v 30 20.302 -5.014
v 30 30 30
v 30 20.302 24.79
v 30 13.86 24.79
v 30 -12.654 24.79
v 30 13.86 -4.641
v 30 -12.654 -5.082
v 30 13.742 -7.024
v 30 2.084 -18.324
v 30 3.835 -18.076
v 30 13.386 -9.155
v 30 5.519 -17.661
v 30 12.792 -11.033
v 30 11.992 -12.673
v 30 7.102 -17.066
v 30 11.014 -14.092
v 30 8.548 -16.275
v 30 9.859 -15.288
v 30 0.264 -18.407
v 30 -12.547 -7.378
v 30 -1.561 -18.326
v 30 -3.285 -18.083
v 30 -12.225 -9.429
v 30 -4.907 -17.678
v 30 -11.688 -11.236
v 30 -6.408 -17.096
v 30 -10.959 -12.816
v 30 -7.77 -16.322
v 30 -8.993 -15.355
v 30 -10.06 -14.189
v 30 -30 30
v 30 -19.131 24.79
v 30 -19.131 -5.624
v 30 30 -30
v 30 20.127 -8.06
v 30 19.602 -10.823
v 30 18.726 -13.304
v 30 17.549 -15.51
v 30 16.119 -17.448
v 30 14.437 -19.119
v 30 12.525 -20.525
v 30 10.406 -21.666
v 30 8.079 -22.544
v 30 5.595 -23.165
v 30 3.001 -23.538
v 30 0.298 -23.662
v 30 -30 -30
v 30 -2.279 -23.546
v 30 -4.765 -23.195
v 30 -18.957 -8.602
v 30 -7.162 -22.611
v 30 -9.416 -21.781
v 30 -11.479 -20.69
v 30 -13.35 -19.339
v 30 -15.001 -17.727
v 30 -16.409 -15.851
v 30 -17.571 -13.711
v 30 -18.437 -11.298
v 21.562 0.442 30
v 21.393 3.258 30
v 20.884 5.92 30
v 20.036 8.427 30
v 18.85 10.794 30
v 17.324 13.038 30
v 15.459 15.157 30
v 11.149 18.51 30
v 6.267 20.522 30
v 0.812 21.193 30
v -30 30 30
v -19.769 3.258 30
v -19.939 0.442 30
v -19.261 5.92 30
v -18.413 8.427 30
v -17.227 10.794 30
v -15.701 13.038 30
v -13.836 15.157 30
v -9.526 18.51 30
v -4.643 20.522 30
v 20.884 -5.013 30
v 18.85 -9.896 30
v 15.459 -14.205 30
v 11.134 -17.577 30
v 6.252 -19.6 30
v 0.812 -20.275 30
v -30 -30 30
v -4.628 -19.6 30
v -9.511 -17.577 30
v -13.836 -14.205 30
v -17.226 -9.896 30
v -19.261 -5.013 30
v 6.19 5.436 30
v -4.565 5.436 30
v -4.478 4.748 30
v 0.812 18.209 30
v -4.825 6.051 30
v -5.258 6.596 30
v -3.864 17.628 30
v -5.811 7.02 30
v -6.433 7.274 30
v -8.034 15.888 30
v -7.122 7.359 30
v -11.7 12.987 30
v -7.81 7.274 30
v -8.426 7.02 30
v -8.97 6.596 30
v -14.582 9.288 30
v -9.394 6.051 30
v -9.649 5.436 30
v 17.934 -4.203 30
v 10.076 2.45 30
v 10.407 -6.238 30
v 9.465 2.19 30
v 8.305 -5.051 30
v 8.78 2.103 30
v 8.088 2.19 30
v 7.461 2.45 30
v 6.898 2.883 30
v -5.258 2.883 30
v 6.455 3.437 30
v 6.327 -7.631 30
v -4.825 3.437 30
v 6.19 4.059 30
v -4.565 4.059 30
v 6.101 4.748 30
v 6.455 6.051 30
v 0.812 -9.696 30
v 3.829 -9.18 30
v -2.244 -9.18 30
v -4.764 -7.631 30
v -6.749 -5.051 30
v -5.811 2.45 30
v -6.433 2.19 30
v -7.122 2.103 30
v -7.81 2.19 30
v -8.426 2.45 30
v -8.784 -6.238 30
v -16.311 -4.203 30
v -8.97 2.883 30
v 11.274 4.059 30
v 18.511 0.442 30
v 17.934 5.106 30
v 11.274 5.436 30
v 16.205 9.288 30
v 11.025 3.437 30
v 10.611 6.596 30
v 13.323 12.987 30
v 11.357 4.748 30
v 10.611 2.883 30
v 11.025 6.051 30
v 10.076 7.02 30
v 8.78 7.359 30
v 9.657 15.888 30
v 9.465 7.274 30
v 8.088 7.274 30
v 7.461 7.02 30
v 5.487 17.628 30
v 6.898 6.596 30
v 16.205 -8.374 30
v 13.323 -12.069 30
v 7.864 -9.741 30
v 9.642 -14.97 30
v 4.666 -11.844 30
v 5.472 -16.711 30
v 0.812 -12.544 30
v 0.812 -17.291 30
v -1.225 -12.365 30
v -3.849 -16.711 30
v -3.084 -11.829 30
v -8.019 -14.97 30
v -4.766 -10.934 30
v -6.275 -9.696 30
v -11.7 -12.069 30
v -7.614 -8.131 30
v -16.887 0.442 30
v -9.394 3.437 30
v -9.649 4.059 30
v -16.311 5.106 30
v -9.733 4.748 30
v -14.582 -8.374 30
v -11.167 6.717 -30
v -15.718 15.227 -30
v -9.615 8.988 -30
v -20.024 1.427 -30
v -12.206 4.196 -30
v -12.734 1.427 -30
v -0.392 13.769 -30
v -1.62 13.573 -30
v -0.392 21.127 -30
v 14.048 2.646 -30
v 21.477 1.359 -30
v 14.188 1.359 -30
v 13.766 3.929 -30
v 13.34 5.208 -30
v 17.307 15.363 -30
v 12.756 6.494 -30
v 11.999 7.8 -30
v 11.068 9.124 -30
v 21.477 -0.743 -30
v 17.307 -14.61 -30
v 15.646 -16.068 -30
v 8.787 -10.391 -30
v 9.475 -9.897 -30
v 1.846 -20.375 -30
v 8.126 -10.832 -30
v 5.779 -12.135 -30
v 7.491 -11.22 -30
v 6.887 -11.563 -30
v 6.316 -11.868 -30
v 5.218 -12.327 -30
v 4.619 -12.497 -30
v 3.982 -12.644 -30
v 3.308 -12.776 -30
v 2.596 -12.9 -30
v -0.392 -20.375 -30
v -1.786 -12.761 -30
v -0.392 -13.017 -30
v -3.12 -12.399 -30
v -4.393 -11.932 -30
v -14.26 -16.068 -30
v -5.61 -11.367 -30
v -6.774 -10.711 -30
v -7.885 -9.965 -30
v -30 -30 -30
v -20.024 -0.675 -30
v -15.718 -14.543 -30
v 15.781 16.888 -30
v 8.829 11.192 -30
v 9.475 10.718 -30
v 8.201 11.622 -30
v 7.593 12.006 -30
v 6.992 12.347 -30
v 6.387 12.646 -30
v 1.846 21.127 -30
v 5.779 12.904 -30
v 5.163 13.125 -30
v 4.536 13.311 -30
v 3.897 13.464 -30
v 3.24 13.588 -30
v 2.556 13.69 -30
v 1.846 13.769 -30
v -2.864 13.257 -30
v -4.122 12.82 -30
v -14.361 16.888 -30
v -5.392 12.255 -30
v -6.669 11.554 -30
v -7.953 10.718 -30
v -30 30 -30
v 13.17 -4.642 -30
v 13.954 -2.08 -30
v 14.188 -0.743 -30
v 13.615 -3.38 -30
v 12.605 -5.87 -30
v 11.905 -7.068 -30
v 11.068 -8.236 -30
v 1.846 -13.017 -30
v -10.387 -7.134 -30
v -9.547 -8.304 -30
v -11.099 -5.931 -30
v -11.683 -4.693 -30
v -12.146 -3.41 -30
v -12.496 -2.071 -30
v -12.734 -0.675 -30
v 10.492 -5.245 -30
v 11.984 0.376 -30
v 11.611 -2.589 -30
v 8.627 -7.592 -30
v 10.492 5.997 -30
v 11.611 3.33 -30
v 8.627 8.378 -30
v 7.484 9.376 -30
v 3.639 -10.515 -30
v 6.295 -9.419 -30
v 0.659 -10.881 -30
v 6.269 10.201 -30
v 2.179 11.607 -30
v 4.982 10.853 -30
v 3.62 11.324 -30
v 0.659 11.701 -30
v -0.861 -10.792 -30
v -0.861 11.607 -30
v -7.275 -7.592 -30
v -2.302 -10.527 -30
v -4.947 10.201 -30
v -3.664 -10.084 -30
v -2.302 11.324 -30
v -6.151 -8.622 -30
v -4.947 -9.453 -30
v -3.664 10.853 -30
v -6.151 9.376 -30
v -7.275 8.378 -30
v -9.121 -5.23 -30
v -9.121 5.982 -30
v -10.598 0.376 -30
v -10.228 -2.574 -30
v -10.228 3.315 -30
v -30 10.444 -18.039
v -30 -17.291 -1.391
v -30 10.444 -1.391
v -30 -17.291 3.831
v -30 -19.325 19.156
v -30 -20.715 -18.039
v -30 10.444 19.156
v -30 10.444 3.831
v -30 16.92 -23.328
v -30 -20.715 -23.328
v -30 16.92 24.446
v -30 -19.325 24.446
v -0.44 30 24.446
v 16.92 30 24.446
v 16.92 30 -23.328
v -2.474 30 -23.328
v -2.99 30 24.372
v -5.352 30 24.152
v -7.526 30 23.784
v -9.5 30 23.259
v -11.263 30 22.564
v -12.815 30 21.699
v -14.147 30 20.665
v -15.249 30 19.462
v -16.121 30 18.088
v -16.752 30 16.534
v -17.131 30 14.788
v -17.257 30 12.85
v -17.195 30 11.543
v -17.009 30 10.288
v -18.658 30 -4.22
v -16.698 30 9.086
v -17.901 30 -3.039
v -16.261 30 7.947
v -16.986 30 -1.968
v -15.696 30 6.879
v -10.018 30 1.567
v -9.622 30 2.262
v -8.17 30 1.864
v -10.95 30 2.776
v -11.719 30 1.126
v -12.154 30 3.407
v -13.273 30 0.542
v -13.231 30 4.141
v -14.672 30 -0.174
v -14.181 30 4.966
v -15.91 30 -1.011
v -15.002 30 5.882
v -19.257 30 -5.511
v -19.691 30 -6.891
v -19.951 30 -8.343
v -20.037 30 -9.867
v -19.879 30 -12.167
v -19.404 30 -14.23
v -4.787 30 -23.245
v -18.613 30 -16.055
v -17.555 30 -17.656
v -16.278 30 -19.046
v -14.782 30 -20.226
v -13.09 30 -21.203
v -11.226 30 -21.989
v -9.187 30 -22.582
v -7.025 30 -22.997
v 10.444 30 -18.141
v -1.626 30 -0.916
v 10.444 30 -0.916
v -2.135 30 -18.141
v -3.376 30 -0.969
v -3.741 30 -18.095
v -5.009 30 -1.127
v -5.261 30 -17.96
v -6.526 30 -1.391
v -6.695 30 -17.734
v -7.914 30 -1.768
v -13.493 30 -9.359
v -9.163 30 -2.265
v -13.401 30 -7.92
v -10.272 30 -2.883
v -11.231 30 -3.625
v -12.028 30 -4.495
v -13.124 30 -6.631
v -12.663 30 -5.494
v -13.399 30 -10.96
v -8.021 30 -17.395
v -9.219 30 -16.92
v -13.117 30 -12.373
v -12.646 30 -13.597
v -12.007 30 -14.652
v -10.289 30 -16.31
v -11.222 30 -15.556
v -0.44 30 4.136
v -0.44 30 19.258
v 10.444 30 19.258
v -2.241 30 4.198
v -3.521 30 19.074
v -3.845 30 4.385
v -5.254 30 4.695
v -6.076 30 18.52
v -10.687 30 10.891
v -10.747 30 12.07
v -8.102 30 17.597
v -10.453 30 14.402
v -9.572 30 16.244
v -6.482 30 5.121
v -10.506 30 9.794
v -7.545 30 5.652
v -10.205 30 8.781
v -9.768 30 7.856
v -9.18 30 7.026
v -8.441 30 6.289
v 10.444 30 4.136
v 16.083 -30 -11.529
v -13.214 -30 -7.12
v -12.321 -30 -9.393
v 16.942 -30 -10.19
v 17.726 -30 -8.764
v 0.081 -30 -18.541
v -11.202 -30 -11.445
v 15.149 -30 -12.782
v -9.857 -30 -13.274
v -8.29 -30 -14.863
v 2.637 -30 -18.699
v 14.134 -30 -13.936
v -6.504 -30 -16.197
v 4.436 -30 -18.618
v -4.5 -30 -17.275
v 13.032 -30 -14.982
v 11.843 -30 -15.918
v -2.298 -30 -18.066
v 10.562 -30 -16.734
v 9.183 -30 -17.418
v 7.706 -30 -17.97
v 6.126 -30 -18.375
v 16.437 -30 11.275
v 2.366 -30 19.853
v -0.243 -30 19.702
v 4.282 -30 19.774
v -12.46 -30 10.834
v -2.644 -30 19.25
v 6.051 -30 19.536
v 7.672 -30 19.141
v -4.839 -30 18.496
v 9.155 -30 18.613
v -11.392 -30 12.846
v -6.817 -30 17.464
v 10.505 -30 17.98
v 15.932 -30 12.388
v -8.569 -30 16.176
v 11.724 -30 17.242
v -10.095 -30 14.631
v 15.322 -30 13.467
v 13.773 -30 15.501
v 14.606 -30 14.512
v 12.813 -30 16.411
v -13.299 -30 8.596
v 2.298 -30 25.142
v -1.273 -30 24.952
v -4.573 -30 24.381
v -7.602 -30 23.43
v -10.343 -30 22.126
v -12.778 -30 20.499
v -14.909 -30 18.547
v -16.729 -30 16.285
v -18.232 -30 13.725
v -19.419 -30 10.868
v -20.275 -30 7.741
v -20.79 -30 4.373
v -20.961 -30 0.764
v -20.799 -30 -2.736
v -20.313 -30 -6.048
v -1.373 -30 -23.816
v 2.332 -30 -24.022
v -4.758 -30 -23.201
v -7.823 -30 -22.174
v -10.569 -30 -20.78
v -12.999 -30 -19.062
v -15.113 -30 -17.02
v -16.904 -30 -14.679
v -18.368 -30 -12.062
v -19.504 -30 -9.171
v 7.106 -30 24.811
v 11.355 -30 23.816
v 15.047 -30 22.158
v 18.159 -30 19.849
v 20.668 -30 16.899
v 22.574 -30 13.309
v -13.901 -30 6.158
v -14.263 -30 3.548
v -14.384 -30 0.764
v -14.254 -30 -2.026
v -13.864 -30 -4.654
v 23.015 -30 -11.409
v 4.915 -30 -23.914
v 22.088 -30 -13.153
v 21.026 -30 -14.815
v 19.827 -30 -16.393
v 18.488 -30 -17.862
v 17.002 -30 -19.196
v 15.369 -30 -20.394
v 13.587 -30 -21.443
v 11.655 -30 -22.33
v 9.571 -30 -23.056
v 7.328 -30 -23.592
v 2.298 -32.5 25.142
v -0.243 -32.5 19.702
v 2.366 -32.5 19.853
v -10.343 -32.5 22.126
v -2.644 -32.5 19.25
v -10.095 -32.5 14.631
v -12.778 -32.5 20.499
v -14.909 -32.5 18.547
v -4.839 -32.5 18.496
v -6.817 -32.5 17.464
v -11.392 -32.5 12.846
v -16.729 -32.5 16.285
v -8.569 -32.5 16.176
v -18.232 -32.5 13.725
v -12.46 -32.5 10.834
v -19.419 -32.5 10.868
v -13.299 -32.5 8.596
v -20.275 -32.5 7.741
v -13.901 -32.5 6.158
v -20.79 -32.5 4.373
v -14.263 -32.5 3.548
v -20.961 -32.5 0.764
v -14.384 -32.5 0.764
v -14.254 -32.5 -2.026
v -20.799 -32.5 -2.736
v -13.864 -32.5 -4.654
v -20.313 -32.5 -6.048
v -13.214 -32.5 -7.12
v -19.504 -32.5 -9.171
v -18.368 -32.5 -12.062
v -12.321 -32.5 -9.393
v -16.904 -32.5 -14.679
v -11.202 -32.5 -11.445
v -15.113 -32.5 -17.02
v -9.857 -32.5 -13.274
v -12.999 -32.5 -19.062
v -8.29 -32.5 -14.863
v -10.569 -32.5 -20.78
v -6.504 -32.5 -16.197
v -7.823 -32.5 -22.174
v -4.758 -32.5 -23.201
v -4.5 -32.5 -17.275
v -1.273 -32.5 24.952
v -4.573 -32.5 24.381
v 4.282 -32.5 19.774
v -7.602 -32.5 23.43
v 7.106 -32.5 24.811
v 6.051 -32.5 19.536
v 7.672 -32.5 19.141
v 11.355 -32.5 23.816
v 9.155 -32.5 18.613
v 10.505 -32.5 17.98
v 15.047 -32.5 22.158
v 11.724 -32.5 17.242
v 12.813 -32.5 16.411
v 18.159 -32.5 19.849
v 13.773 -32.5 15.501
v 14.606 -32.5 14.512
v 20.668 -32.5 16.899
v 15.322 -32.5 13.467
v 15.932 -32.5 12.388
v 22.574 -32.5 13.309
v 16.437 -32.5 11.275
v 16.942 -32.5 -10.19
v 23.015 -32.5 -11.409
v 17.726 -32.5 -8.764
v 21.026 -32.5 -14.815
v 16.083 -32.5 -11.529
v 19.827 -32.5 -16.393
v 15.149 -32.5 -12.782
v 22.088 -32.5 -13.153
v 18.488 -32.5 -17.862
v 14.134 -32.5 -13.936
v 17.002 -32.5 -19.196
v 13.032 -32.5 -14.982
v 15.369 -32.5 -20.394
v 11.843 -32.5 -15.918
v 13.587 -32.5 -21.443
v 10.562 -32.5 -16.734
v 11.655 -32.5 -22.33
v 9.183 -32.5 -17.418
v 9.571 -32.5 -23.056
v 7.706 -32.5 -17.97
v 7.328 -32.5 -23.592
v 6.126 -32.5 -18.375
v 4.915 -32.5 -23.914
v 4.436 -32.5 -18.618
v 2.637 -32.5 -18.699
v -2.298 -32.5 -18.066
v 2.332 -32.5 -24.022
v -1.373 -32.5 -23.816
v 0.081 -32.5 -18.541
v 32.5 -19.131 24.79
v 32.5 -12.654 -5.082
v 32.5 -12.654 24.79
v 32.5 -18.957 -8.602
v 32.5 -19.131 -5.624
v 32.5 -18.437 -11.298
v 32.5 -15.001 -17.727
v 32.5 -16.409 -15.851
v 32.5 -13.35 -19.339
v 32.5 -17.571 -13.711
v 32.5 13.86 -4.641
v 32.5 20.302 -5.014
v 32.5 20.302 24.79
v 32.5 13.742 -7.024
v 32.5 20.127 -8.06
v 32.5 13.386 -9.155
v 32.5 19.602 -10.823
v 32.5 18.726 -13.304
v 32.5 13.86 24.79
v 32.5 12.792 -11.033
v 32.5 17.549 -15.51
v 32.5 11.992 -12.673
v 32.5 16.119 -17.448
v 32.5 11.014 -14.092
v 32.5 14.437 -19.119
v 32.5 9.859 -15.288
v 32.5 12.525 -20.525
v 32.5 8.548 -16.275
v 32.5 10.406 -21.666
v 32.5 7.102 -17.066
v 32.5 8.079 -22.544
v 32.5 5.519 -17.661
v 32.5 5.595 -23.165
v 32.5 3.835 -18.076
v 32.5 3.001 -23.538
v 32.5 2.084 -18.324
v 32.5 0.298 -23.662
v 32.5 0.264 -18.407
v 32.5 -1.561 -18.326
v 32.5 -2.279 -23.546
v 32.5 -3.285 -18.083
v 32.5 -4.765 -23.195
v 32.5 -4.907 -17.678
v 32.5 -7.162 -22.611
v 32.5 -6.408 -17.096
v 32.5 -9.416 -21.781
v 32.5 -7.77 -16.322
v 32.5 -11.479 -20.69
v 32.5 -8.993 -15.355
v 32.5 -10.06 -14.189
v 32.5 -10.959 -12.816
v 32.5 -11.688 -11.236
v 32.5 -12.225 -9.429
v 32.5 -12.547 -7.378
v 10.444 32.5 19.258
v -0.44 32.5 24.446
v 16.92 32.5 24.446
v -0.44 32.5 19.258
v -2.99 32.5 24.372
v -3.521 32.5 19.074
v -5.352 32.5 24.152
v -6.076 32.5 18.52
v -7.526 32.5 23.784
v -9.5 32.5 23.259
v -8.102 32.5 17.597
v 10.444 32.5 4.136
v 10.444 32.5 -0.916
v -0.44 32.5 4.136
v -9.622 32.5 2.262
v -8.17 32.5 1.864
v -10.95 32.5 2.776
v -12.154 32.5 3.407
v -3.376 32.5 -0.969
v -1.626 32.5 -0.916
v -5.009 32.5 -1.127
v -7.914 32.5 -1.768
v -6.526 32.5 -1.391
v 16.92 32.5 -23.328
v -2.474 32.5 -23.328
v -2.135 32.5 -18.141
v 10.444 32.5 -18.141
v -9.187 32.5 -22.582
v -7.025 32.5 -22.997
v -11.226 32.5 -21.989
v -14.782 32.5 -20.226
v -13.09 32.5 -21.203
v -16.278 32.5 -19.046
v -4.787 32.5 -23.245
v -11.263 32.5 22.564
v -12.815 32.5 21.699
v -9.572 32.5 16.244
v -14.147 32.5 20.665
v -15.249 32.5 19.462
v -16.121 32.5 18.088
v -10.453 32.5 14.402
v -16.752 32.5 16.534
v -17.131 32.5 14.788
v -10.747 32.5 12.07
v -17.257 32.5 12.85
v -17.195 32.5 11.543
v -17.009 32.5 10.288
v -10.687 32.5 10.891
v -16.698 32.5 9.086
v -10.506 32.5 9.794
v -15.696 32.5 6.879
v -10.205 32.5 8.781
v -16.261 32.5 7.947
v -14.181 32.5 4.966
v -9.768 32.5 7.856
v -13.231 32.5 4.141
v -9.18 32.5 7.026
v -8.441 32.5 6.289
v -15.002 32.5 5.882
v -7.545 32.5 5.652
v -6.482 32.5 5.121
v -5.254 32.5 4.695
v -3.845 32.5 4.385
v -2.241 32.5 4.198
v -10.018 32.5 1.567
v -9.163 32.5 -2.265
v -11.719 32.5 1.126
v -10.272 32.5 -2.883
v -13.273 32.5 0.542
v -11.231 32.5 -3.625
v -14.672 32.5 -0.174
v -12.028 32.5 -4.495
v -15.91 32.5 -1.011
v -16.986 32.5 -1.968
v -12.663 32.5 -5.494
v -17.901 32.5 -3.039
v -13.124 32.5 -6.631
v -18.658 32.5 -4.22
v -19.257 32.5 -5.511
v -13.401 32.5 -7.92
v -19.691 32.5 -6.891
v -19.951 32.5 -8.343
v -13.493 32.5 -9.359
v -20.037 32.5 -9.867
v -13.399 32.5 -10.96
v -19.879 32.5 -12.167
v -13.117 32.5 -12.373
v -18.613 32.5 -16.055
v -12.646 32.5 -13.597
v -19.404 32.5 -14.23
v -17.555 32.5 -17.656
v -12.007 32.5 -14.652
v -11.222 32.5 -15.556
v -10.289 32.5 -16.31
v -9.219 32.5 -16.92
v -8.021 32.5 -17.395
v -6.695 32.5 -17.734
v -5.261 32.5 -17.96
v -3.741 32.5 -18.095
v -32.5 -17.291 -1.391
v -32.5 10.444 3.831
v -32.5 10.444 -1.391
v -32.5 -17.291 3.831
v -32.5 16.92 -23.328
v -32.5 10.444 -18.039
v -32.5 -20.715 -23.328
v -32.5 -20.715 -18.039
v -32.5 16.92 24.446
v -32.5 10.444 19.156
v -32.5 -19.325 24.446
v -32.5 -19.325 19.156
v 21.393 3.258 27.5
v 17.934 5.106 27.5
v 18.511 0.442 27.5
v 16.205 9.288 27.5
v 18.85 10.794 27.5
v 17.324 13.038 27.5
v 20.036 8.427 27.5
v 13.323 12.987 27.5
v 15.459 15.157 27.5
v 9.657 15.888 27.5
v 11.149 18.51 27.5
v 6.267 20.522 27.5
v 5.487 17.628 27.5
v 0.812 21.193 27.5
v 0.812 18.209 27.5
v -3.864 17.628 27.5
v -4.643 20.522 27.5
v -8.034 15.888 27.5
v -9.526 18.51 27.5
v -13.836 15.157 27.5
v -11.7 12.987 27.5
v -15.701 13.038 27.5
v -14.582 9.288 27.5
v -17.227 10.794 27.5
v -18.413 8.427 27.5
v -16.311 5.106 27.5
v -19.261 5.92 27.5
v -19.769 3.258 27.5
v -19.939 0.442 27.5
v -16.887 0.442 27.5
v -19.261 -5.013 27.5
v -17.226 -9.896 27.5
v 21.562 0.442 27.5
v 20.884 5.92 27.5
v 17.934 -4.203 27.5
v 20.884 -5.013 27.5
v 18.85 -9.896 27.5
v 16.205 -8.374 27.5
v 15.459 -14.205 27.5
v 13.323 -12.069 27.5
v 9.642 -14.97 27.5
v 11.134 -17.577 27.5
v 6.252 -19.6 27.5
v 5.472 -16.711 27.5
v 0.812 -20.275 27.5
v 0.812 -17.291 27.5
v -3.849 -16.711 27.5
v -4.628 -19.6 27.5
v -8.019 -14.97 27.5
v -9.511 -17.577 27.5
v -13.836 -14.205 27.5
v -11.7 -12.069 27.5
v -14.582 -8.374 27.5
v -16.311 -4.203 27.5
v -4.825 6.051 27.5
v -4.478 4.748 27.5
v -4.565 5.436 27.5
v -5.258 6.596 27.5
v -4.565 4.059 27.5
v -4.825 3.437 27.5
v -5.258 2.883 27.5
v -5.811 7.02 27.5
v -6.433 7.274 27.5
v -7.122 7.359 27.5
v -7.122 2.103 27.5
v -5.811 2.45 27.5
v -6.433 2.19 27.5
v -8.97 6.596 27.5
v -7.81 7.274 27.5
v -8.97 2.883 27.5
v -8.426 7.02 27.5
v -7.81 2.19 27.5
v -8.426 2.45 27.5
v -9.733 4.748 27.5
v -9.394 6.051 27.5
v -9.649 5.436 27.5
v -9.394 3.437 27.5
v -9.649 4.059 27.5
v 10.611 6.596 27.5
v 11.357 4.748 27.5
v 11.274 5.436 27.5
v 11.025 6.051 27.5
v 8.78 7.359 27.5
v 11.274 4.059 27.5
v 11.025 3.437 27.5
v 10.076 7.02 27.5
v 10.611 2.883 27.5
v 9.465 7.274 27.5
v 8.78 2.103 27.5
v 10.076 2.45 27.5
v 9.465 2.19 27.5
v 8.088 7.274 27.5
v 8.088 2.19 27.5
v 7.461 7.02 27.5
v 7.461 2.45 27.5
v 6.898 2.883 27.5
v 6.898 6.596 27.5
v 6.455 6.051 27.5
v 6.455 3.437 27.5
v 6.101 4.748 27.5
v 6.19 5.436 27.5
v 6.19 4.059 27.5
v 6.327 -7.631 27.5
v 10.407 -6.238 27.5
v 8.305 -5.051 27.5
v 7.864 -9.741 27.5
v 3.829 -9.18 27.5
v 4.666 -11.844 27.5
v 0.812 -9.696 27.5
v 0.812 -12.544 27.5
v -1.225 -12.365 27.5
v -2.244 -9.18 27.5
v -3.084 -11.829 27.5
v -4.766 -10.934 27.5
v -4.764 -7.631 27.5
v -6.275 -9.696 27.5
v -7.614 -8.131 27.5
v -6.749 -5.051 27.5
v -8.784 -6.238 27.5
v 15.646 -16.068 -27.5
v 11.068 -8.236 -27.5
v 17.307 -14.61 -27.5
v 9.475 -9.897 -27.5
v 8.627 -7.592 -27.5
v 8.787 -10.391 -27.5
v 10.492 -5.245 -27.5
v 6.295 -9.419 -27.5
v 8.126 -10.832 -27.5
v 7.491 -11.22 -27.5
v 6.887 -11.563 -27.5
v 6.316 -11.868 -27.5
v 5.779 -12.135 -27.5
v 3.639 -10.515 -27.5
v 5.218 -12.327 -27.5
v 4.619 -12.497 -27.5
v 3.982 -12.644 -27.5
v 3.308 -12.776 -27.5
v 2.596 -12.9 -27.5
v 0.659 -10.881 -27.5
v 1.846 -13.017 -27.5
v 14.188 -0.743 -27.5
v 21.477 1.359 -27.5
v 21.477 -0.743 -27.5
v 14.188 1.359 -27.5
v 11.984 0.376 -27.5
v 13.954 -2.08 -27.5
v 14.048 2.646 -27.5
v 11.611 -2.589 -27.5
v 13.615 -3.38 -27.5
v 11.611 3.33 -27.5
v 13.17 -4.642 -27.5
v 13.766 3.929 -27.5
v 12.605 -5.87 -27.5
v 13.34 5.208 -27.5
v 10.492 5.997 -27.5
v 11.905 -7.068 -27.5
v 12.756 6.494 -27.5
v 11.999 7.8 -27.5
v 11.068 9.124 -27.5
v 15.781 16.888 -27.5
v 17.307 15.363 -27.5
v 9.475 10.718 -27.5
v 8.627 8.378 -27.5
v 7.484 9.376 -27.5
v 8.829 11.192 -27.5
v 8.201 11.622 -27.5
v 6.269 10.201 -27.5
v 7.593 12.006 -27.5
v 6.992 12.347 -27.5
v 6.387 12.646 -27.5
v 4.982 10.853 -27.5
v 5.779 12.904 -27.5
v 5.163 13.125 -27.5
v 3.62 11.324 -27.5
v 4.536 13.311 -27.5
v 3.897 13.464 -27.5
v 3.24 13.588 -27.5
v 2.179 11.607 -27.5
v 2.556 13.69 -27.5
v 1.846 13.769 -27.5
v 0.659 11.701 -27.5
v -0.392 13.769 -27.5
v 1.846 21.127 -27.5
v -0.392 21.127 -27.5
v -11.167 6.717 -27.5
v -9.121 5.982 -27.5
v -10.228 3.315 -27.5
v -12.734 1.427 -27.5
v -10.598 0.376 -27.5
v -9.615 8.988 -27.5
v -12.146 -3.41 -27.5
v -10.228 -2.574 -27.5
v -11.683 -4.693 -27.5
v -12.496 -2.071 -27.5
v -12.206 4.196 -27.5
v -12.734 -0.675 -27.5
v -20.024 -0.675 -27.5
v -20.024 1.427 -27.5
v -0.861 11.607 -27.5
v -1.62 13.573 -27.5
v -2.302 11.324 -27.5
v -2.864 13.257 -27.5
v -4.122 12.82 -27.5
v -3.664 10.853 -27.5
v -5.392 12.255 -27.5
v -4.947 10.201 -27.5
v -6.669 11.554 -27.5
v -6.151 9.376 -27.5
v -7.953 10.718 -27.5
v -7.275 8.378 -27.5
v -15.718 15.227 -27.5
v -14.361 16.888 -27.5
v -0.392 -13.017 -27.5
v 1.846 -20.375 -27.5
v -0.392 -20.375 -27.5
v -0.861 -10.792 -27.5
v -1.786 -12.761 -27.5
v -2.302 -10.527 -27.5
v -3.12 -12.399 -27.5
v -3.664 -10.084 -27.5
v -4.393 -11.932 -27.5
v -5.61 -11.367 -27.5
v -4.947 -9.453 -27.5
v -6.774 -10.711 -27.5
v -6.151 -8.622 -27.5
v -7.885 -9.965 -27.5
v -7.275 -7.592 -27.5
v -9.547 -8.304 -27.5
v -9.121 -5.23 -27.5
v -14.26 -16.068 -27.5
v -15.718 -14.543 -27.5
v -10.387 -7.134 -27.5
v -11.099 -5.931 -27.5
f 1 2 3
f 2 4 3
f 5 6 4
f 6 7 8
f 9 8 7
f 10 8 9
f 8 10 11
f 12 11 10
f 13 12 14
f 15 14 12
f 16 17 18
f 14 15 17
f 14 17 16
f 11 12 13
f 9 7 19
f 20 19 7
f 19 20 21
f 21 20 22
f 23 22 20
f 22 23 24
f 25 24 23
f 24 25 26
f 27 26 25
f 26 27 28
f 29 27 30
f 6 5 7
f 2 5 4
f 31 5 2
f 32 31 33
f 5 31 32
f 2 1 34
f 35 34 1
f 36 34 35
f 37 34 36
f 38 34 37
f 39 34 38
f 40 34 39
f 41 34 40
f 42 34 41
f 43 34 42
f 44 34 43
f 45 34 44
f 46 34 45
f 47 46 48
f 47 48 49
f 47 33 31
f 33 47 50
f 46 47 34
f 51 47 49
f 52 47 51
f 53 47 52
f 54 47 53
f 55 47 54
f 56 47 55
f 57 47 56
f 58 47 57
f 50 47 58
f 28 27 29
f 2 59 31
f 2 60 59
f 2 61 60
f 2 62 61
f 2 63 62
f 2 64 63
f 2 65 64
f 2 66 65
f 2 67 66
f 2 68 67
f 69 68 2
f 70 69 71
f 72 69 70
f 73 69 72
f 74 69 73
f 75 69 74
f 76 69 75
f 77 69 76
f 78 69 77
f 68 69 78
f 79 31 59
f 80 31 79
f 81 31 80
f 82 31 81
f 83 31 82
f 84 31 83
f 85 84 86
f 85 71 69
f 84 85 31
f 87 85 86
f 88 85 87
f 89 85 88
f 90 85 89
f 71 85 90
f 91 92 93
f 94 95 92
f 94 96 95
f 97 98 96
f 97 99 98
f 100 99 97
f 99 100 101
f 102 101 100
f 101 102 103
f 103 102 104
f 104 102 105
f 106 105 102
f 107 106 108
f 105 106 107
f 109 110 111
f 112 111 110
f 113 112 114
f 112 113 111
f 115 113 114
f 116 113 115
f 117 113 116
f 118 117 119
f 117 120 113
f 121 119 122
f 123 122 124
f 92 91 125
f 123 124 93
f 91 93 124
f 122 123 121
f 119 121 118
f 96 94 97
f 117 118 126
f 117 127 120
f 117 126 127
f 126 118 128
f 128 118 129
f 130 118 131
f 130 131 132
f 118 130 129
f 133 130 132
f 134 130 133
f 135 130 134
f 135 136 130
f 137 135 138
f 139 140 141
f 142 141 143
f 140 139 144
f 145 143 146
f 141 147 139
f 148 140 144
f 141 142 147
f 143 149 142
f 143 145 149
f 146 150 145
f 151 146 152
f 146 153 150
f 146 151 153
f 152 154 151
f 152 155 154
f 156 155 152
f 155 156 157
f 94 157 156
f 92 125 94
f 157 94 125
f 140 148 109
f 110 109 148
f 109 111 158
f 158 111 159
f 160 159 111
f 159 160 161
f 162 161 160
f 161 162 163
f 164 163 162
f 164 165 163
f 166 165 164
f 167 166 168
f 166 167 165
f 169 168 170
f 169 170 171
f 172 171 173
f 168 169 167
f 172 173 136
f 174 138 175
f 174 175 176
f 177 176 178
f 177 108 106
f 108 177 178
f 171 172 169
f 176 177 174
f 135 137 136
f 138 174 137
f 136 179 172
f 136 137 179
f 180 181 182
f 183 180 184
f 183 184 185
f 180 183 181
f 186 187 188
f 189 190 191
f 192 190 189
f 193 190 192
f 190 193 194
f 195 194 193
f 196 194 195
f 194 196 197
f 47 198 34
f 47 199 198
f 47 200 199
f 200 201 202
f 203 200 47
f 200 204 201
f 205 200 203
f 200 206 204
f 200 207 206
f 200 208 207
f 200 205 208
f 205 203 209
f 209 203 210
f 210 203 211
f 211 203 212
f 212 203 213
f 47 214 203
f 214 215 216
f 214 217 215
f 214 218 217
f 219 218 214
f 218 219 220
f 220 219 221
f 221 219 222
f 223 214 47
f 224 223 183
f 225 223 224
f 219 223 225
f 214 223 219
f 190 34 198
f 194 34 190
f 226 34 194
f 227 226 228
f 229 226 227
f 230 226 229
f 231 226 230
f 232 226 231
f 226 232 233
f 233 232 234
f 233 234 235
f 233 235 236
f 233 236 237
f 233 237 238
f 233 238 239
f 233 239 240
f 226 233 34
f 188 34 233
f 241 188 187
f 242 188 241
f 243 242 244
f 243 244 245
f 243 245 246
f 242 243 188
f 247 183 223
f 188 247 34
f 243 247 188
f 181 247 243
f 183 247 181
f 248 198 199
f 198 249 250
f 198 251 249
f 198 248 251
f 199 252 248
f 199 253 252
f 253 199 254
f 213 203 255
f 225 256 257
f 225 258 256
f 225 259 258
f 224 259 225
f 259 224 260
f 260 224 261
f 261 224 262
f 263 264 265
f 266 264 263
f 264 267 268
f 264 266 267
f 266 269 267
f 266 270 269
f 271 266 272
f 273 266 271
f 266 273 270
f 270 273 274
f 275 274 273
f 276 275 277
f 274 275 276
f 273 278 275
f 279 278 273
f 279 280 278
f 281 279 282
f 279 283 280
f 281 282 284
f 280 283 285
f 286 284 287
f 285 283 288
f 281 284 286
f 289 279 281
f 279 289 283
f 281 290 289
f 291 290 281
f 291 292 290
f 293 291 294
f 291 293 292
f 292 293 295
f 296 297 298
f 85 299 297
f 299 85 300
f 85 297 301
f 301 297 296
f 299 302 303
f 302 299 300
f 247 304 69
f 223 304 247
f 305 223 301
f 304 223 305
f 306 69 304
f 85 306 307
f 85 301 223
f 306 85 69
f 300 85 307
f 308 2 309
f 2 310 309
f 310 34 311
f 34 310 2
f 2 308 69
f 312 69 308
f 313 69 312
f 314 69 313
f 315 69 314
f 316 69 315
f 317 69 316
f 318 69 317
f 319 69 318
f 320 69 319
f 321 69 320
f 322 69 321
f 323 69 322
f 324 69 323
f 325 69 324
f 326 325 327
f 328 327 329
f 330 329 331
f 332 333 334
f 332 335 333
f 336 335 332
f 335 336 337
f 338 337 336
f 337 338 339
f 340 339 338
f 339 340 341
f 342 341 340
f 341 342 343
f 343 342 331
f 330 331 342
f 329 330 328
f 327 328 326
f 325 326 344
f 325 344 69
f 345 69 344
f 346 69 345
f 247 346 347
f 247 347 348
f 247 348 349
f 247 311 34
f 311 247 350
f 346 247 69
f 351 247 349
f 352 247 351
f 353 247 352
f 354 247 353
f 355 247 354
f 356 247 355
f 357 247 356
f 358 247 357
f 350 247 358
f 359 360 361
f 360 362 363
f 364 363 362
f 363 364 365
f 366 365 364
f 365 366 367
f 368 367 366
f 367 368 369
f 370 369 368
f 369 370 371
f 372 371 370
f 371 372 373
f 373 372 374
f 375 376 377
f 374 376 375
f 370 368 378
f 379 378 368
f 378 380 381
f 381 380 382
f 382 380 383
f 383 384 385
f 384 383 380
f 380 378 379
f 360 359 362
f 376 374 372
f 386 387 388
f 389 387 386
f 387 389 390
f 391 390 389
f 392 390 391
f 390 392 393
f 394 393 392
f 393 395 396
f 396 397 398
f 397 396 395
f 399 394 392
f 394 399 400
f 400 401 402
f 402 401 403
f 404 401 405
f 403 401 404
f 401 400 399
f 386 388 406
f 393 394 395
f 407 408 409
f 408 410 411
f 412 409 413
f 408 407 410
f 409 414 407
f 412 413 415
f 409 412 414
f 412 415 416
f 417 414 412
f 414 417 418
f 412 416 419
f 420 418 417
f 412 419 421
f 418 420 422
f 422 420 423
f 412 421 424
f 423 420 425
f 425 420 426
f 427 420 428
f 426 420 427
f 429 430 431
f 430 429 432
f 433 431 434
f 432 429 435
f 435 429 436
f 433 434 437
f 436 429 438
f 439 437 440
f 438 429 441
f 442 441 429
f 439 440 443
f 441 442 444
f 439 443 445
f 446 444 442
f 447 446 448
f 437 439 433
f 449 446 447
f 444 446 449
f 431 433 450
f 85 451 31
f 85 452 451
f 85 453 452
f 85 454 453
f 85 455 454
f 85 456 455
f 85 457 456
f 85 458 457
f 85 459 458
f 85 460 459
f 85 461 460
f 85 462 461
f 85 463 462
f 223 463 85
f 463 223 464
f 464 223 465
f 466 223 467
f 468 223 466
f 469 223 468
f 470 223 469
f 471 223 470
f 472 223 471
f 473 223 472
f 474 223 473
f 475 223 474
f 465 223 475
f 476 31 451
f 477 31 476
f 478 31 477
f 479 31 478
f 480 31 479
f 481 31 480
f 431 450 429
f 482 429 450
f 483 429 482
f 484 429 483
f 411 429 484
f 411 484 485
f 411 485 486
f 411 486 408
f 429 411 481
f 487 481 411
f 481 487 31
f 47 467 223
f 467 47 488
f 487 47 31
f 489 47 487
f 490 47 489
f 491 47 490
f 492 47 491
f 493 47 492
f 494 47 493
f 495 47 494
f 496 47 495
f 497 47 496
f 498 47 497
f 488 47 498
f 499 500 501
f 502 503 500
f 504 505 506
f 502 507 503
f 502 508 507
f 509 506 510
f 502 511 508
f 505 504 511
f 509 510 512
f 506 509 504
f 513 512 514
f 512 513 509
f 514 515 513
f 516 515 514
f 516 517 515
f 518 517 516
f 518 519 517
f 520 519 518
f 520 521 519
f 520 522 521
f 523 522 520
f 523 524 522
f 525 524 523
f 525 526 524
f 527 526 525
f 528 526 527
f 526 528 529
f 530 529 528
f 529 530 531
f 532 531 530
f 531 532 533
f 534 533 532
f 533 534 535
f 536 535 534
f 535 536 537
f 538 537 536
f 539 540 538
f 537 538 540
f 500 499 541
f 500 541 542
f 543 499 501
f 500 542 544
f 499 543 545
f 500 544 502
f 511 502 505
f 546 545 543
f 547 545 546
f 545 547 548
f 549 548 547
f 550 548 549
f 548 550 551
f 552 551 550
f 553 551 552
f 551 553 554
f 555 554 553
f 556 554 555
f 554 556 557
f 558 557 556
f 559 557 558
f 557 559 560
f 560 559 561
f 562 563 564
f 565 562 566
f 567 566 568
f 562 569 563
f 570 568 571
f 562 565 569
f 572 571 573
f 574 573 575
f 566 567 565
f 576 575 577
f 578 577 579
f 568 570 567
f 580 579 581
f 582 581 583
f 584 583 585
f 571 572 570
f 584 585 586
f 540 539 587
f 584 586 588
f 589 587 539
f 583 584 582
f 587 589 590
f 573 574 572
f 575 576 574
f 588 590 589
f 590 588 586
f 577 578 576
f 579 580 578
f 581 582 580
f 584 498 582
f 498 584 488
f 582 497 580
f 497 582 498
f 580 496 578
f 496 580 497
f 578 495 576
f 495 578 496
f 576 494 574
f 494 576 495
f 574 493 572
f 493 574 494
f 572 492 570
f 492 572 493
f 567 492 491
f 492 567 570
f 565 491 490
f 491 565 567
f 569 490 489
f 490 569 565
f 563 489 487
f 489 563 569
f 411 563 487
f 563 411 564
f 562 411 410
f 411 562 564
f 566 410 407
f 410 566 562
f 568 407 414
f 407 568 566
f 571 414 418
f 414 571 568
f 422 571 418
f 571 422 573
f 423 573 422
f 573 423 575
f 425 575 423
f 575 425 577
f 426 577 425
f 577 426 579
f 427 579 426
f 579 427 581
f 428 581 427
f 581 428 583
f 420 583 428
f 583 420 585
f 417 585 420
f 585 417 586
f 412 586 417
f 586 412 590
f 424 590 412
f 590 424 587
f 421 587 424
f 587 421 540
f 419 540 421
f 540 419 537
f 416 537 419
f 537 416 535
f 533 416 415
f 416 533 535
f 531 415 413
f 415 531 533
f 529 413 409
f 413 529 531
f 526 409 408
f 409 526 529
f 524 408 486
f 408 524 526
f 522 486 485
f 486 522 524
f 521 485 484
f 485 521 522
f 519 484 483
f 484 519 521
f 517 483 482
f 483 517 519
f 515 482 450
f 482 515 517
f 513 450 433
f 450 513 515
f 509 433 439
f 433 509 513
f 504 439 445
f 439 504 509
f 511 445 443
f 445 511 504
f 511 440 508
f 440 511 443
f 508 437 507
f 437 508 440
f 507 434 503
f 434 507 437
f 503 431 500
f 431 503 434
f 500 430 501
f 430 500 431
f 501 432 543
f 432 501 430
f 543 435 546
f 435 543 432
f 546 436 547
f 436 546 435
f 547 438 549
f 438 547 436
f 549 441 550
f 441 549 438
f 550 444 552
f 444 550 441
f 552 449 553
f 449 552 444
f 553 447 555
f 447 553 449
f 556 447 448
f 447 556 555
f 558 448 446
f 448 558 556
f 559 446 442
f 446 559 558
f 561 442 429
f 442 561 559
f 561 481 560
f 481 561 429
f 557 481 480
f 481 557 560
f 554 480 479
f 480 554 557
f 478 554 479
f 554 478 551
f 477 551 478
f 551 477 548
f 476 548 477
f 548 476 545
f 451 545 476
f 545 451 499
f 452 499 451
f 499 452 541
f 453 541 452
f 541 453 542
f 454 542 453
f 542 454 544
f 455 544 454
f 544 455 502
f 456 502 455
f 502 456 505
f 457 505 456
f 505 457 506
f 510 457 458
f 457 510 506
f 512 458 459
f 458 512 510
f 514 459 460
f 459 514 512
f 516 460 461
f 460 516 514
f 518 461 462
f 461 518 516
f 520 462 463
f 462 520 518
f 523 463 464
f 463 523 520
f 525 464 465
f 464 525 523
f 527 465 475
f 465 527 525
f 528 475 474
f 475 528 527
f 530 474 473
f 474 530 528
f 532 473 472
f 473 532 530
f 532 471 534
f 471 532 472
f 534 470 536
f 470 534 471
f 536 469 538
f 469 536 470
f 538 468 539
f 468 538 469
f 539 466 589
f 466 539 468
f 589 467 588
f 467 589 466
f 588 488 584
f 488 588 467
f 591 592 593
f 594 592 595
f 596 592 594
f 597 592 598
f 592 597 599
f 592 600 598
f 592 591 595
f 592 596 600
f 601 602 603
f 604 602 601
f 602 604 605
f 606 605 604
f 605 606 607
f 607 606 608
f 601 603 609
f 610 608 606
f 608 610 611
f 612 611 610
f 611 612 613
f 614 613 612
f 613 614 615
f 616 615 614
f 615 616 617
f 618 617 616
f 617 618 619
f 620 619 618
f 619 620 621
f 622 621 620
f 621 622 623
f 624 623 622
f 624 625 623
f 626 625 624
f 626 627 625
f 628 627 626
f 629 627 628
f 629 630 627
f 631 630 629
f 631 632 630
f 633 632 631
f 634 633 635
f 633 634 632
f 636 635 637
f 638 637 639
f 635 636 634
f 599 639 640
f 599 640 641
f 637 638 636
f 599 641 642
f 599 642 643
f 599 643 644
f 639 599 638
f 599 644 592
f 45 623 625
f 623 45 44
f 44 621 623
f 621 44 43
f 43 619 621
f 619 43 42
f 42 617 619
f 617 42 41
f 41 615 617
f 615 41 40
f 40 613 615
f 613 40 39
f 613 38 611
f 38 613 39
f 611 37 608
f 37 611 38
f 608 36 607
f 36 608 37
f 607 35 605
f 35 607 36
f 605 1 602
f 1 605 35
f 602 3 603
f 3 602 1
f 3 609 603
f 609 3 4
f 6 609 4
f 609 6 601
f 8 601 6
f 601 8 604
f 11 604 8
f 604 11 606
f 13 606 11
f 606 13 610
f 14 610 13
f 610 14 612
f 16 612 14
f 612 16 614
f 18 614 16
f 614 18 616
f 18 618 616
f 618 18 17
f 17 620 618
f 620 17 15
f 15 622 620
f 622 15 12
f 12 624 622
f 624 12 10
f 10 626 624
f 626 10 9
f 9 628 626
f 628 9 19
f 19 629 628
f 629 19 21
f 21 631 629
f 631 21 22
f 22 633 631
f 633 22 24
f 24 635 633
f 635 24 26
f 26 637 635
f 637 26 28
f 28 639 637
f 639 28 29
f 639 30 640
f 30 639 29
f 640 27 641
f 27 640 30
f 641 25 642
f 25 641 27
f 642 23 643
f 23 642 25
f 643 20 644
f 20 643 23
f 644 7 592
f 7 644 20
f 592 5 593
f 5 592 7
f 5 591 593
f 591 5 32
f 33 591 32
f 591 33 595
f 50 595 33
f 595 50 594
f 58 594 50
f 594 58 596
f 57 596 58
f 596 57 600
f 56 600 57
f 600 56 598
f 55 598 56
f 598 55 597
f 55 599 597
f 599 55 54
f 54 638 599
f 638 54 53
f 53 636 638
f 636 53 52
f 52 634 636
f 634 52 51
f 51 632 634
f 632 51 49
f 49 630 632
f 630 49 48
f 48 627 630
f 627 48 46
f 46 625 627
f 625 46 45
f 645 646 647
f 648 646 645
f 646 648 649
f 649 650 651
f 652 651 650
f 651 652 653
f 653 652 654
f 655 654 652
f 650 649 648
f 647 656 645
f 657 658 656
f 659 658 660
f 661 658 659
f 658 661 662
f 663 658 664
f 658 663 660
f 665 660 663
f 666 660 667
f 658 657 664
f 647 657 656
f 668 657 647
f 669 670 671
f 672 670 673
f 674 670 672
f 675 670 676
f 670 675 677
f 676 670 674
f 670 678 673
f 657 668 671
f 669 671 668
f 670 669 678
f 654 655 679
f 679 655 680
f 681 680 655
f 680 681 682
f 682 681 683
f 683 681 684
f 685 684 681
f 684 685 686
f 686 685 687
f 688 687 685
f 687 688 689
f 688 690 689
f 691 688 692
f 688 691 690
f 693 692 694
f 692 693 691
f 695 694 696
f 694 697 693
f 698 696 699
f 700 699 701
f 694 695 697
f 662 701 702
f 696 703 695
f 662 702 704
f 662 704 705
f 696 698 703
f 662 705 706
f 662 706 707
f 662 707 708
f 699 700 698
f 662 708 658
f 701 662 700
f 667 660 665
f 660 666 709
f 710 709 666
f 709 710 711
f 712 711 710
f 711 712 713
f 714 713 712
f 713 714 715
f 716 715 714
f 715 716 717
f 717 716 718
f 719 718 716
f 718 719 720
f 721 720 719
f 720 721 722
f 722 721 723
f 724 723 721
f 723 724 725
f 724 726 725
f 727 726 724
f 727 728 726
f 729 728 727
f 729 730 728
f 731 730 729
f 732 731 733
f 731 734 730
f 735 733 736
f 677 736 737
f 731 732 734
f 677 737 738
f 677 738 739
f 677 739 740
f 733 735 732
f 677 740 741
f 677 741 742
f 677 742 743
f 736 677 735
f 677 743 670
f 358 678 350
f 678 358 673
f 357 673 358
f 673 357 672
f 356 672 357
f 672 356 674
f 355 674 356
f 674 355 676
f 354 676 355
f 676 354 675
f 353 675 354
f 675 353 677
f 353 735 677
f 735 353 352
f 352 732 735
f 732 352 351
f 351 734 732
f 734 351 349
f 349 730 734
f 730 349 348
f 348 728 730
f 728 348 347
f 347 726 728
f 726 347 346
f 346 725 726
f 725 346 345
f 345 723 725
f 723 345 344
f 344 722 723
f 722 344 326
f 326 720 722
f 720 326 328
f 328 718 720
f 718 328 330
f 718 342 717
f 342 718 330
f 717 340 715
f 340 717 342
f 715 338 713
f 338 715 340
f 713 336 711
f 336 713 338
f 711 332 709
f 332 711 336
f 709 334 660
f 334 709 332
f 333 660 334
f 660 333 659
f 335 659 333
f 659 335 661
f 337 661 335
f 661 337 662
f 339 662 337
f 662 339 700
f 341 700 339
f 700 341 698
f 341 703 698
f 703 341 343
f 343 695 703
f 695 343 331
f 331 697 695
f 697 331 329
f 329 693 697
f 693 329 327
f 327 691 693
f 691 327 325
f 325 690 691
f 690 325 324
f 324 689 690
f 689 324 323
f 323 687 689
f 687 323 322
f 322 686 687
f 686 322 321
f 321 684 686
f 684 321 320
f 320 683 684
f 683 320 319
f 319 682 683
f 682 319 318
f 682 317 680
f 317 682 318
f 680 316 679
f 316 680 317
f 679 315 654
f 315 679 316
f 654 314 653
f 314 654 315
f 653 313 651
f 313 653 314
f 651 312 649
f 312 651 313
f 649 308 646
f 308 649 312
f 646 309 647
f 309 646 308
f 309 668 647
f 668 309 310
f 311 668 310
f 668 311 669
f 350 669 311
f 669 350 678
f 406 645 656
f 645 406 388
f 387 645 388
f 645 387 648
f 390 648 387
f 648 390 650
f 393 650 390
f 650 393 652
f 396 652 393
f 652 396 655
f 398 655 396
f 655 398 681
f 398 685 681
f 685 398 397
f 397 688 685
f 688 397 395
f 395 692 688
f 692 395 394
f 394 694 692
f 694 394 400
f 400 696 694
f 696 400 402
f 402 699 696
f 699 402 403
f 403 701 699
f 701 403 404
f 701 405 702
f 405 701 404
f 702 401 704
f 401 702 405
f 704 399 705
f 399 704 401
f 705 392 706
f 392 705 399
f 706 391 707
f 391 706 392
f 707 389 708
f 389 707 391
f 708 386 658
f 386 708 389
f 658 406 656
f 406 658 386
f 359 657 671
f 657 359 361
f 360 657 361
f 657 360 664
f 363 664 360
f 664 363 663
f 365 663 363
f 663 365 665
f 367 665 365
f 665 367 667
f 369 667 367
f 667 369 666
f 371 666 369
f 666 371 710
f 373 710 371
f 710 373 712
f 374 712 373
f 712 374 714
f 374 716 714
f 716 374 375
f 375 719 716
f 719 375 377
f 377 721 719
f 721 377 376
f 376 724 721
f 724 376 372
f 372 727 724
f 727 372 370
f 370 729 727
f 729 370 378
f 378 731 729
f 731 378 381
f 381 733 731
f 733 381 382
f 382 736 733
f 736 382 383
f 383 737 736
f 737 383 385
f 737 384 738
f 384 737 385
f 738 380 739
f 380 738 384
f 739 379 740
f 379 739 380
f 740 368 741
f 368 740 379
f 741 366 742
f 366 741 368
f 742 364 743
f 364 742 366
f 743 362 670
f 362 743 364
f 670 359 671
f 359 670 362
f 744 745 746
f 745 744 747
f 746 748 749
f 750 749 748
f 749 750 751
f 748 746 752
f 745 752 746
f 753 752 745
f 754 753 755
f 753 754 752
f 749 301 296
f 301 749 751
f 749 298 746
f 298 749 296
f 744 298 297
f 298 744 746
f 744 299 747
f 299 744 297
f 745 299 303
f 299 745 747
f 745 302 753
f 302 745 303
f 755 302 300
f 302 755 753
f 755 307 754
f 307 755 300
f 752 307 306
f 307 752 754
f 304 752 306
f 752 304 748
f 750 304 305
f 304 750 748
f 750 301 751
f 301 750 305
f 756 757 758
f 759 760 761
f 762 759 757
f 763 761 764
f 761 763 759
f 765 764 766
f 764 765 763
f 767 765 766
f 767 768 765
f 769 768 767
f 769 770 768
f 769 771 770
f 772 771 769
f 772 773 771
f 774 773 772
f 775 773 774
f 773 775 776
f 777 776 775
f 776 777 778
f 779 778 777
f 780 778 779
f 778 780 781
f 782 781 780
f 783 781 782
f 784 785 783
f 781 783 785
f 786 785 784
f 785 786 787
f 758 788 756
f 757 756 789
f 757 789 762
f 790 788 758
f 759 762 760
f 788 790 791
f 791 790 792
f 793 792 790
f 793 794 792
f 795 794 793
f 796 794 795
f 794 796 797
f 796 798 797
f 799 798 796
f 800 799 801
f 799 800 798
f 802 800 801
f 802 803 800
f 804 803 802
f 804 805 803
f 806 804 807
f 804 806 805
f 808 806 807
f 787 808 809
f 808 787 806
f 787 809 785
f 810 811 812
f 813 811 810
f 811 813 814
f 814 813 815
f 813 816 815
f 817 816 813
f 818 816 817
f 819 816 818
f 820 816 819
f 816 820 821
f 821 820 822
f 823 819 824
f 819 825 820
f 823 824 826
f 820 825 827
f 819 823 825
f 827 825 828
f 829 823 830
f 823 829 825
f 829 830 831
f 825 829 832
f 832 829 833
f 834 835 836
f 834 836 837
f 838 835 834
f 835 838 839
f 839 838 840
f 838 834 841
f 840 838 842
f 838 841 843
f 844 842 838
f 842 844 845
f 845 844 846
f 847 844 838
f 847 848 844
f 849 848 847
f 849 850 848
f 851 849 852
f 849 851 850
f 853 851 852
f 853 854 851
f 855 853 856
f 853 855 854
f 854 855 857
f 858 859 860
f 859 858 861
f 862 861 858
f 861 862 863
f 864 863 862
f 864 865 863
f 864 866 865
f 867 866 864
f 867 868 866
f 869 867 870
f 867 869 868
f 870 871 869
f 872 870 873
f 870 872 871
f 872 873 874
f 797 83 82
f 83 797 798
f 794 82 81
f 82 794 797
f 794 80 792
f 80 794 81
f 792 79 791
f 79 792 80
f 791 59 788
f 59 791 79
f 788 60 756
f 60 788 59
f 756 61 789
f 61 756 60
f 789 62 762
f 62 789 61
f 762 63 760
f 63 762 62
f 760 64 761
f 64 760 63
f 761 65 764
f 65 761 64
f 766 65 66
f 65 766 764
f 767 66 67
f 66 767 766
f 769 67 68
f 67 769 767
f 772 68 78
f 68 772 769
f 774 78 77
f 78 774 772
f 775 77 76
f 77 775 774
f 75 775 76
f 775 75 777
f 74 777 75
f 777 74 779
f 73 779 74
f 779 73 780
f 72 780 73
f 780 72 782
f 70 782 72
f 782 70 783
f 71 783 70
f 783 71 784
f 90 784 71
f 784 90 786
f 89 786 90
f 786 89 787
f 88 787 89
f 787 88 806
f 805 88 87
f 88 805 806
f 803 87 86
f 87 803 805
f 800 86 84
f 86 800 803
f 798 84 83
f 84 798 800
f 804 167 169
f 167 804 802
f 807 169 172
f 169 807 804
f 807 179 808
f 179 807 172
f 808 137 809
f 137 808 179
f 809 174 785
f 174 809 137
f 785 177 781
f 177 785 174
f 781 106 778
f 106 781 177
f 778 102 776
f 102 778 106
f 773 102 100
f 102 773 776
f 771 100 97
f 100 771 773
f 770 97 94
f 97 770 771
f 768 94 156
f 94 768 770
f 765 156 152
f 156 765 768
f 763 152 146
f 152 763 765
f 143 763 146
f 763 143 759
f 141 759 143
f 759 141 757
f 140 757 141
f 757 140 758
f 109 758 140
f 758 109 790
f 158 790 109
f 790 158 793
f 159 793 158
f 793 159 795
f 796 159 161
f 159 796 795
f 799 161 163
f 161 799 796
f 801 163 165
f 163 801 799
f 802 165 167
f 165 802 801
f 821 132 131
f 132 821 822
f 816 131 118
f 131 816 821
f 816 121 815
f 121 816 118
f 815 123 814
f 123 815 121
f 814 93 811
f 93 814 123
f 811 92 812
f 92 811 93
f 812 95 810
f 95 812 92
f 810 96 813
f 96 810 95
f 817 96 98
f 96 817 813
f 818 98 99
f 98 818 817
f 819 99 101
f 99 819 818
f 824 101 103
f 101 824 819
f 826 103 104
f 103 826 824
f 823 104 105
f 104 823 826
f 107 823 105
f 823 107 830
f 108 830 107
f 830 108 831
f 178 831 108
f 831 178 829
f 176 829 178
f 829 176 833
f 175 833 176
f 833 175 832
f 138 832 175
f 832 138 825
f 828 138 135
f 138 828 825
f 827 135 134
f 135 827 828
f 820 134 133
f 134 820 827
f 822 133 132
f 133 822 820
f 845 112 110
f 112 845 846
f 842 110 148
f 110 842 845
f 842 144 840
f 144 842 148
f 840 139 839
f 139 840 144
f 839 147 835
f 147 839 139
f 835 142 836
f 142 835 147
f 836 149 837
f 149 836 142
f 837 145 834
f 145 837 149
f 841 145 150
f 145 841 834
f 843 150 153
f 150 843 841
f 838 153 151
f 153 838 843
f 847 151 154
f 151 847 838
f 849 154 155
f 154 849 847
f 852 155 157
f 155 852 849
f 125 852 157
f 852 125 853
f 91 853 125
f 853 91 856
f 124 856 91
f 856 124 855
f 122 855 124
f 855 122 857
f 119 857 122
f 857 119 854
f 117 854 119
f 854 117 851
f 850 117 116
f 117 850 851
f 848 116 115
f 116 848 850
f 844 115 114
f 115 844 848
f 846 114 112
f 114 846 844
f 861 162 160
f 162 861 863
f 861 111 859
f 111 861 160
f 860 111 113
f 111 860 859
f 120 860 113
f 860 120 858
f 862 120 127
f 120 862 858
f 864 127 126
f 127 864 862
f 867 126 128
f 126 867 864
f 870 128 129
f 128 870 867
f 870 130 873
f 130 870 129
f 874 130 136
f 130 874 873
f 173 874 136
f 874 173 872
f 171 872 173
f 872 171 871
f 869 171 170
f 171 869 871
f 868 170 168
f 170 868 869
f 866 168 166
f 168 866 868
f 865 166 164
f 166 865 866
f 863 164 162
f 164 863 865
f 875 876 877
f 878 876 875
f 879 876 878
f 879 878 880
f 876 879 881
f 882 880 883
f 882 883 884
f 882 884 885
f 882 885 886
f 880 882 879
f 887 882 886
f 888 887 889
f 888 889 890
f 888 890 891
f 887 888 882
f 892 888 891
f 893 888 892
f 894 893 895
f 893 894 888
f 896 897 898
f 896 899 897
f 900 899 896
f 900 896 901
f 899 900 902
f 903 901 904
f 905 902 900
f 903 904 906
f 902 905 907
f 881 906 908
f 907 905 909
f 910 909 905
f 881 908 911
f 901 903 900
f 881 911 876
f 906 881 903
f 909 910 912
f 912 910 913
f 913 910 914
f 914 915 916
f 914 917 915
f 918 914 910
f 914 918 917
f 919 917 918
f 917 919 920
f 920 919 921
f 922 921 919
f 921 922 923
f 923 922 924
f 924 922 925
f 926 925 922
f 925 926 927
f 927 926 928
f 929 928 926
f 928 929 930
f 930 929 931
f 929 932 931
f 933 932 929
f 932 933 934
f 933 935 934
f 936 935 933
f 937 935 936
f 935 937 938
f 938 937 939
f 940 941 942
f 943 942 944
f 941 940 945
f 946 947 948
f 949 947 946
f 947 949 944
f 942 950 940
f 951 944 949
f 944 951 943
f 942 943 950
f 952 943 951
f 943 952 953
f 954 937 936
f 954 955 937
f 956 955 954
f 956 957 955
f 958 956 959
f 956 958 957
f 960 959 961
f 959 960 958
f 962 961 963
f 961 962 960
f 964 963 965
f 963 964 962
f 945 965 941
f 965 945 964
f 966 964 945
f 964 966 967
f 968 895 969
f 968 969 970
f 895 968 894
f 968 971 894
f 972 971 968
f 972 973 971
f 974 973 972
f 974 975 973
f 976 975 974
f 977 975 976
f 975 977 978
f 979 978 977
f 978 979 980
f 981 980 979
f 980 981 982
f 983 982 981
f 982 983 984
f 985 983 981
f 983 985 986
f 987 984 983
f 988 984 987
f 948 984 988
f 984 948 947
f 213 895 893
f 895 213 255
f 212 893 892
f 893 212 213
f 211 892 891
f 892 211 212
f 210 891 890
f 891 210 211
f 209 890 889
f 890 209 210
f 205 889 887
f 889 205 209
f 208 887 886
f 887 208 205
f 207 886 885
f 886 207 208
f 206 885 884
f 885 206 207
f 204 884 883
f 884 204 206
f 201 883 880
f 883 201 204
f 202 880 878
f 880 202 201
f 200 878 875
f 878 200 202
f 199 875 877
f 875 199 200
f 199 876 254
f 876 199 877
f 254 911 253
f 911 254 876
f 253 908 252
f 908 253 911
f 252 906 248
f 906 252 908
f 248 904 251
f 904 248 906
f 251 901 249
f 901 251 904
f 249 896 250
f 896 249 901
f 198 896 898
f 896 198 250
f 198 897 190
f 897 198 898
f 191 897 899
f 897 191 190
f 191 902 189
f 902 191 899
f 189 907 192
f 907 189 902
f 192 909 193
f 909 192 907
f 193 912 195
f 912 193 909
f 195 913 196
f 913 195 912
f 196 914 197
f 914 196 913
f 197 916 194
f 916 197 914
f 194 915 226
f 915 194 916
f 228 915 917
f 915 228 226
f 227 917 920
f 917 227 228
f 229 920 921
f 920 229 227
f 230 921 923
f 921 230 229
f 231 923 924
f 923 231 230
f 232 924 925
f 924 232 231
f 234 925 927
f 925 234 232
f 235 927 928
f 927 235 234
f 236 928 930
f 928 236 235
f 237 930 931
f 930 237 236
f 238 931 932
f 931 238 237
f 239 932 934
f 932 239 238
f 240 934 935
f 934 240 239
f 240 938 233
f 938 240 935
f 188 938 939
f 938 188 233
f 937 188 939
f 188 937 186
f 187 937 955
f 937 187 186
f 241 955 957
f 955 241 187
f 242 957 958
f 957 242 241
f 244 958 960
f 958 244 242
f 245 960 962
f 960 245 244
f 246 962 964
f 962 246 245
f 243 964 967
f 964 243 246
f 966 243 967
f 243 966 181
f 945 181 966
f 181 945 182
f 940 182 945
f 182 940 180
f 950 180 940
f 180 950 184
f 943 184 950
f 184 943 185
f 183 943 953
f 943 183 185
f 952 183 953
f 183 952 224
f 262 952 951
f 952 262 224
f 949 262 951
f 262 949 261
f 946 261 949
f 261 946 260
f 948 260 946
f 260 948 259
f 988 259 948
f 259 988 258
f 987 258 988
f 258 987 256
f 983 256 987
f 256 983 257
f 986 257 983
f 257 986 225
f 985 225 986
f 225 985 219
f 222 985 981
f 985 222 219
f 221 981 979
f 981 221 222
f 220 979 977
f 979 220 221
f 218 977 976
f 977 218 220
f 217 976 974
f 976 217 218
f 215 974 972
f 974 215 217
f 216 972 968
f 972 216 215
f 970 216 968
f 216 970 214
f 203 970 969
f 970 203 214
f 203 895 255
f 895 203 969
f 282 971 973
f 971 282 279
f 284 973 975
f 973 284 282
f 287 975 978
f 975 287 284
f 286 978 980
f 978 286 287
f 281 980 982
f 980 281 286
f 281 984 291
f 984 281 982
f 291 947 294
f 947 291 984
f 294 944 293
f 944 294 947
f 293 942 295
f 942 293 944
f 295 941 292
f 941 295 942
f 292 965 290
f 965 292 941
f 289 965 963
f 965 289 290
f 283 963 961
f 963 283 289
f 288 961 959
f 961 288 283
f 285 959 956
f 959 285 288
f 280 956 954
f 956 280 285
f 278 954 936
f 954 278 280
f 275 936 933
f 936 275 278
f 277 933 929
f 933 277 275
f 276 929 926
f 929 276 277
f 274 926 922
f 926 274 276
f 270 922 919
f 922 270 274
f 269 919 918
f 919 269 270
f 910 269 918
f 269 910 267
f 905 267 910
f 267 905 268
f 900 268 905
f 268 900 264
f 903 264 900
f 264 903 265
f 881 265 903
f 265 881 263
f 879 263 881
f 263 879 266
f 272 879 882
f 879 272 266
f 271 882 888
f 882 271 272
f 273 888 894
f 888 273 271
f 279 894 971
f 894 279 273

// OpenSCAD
// Example for text() usage
// (c) 2014 Torsten Paul
// CC-BY-SA 4.0

font = "Liberation Sans";

cube_size = 60;
letter_size = 50;
letter_height = 5;

o = cube_size / 2 - letter_height / 2;

module letter(l) {
	// Use linear_extrude() to make the letters 3D objects as they
	// are only 2D shapes when only using text()
	linear_extrude(height = letter_height) {
		text(l, size = letter_size, font = font, halign = "center", valign = "center", $fn = 16);
	}
}

difference() {
	union() {
		color("gray") cube(cube_size, center = true);
		translate([0, -o, 0]) rotate([90, 0, 0]) letter("C");
		translate([o, 0, 0]) rotate([90, 0, 90]) letter("U");
		translate([0, o, 0]) rotate([90, 0, 180]) letter("B");
		translate([-o, 0, 0]) rotate([90, 0, -90]) letter("E");
	}

	// Put some symbols on top and bottom using symbols from the
	// Unicode symbols table.
	// (see https://en.wikipedia.org/wiki/Miscellaneous_Symbols)
	//
	// Note that depending on the font used, not all the symbols
	// are actually available.
	translate([0, 0, o])  letter("\u263A");
	translate([0, 0, -o - letter_height])  letter("\u263C");
}
